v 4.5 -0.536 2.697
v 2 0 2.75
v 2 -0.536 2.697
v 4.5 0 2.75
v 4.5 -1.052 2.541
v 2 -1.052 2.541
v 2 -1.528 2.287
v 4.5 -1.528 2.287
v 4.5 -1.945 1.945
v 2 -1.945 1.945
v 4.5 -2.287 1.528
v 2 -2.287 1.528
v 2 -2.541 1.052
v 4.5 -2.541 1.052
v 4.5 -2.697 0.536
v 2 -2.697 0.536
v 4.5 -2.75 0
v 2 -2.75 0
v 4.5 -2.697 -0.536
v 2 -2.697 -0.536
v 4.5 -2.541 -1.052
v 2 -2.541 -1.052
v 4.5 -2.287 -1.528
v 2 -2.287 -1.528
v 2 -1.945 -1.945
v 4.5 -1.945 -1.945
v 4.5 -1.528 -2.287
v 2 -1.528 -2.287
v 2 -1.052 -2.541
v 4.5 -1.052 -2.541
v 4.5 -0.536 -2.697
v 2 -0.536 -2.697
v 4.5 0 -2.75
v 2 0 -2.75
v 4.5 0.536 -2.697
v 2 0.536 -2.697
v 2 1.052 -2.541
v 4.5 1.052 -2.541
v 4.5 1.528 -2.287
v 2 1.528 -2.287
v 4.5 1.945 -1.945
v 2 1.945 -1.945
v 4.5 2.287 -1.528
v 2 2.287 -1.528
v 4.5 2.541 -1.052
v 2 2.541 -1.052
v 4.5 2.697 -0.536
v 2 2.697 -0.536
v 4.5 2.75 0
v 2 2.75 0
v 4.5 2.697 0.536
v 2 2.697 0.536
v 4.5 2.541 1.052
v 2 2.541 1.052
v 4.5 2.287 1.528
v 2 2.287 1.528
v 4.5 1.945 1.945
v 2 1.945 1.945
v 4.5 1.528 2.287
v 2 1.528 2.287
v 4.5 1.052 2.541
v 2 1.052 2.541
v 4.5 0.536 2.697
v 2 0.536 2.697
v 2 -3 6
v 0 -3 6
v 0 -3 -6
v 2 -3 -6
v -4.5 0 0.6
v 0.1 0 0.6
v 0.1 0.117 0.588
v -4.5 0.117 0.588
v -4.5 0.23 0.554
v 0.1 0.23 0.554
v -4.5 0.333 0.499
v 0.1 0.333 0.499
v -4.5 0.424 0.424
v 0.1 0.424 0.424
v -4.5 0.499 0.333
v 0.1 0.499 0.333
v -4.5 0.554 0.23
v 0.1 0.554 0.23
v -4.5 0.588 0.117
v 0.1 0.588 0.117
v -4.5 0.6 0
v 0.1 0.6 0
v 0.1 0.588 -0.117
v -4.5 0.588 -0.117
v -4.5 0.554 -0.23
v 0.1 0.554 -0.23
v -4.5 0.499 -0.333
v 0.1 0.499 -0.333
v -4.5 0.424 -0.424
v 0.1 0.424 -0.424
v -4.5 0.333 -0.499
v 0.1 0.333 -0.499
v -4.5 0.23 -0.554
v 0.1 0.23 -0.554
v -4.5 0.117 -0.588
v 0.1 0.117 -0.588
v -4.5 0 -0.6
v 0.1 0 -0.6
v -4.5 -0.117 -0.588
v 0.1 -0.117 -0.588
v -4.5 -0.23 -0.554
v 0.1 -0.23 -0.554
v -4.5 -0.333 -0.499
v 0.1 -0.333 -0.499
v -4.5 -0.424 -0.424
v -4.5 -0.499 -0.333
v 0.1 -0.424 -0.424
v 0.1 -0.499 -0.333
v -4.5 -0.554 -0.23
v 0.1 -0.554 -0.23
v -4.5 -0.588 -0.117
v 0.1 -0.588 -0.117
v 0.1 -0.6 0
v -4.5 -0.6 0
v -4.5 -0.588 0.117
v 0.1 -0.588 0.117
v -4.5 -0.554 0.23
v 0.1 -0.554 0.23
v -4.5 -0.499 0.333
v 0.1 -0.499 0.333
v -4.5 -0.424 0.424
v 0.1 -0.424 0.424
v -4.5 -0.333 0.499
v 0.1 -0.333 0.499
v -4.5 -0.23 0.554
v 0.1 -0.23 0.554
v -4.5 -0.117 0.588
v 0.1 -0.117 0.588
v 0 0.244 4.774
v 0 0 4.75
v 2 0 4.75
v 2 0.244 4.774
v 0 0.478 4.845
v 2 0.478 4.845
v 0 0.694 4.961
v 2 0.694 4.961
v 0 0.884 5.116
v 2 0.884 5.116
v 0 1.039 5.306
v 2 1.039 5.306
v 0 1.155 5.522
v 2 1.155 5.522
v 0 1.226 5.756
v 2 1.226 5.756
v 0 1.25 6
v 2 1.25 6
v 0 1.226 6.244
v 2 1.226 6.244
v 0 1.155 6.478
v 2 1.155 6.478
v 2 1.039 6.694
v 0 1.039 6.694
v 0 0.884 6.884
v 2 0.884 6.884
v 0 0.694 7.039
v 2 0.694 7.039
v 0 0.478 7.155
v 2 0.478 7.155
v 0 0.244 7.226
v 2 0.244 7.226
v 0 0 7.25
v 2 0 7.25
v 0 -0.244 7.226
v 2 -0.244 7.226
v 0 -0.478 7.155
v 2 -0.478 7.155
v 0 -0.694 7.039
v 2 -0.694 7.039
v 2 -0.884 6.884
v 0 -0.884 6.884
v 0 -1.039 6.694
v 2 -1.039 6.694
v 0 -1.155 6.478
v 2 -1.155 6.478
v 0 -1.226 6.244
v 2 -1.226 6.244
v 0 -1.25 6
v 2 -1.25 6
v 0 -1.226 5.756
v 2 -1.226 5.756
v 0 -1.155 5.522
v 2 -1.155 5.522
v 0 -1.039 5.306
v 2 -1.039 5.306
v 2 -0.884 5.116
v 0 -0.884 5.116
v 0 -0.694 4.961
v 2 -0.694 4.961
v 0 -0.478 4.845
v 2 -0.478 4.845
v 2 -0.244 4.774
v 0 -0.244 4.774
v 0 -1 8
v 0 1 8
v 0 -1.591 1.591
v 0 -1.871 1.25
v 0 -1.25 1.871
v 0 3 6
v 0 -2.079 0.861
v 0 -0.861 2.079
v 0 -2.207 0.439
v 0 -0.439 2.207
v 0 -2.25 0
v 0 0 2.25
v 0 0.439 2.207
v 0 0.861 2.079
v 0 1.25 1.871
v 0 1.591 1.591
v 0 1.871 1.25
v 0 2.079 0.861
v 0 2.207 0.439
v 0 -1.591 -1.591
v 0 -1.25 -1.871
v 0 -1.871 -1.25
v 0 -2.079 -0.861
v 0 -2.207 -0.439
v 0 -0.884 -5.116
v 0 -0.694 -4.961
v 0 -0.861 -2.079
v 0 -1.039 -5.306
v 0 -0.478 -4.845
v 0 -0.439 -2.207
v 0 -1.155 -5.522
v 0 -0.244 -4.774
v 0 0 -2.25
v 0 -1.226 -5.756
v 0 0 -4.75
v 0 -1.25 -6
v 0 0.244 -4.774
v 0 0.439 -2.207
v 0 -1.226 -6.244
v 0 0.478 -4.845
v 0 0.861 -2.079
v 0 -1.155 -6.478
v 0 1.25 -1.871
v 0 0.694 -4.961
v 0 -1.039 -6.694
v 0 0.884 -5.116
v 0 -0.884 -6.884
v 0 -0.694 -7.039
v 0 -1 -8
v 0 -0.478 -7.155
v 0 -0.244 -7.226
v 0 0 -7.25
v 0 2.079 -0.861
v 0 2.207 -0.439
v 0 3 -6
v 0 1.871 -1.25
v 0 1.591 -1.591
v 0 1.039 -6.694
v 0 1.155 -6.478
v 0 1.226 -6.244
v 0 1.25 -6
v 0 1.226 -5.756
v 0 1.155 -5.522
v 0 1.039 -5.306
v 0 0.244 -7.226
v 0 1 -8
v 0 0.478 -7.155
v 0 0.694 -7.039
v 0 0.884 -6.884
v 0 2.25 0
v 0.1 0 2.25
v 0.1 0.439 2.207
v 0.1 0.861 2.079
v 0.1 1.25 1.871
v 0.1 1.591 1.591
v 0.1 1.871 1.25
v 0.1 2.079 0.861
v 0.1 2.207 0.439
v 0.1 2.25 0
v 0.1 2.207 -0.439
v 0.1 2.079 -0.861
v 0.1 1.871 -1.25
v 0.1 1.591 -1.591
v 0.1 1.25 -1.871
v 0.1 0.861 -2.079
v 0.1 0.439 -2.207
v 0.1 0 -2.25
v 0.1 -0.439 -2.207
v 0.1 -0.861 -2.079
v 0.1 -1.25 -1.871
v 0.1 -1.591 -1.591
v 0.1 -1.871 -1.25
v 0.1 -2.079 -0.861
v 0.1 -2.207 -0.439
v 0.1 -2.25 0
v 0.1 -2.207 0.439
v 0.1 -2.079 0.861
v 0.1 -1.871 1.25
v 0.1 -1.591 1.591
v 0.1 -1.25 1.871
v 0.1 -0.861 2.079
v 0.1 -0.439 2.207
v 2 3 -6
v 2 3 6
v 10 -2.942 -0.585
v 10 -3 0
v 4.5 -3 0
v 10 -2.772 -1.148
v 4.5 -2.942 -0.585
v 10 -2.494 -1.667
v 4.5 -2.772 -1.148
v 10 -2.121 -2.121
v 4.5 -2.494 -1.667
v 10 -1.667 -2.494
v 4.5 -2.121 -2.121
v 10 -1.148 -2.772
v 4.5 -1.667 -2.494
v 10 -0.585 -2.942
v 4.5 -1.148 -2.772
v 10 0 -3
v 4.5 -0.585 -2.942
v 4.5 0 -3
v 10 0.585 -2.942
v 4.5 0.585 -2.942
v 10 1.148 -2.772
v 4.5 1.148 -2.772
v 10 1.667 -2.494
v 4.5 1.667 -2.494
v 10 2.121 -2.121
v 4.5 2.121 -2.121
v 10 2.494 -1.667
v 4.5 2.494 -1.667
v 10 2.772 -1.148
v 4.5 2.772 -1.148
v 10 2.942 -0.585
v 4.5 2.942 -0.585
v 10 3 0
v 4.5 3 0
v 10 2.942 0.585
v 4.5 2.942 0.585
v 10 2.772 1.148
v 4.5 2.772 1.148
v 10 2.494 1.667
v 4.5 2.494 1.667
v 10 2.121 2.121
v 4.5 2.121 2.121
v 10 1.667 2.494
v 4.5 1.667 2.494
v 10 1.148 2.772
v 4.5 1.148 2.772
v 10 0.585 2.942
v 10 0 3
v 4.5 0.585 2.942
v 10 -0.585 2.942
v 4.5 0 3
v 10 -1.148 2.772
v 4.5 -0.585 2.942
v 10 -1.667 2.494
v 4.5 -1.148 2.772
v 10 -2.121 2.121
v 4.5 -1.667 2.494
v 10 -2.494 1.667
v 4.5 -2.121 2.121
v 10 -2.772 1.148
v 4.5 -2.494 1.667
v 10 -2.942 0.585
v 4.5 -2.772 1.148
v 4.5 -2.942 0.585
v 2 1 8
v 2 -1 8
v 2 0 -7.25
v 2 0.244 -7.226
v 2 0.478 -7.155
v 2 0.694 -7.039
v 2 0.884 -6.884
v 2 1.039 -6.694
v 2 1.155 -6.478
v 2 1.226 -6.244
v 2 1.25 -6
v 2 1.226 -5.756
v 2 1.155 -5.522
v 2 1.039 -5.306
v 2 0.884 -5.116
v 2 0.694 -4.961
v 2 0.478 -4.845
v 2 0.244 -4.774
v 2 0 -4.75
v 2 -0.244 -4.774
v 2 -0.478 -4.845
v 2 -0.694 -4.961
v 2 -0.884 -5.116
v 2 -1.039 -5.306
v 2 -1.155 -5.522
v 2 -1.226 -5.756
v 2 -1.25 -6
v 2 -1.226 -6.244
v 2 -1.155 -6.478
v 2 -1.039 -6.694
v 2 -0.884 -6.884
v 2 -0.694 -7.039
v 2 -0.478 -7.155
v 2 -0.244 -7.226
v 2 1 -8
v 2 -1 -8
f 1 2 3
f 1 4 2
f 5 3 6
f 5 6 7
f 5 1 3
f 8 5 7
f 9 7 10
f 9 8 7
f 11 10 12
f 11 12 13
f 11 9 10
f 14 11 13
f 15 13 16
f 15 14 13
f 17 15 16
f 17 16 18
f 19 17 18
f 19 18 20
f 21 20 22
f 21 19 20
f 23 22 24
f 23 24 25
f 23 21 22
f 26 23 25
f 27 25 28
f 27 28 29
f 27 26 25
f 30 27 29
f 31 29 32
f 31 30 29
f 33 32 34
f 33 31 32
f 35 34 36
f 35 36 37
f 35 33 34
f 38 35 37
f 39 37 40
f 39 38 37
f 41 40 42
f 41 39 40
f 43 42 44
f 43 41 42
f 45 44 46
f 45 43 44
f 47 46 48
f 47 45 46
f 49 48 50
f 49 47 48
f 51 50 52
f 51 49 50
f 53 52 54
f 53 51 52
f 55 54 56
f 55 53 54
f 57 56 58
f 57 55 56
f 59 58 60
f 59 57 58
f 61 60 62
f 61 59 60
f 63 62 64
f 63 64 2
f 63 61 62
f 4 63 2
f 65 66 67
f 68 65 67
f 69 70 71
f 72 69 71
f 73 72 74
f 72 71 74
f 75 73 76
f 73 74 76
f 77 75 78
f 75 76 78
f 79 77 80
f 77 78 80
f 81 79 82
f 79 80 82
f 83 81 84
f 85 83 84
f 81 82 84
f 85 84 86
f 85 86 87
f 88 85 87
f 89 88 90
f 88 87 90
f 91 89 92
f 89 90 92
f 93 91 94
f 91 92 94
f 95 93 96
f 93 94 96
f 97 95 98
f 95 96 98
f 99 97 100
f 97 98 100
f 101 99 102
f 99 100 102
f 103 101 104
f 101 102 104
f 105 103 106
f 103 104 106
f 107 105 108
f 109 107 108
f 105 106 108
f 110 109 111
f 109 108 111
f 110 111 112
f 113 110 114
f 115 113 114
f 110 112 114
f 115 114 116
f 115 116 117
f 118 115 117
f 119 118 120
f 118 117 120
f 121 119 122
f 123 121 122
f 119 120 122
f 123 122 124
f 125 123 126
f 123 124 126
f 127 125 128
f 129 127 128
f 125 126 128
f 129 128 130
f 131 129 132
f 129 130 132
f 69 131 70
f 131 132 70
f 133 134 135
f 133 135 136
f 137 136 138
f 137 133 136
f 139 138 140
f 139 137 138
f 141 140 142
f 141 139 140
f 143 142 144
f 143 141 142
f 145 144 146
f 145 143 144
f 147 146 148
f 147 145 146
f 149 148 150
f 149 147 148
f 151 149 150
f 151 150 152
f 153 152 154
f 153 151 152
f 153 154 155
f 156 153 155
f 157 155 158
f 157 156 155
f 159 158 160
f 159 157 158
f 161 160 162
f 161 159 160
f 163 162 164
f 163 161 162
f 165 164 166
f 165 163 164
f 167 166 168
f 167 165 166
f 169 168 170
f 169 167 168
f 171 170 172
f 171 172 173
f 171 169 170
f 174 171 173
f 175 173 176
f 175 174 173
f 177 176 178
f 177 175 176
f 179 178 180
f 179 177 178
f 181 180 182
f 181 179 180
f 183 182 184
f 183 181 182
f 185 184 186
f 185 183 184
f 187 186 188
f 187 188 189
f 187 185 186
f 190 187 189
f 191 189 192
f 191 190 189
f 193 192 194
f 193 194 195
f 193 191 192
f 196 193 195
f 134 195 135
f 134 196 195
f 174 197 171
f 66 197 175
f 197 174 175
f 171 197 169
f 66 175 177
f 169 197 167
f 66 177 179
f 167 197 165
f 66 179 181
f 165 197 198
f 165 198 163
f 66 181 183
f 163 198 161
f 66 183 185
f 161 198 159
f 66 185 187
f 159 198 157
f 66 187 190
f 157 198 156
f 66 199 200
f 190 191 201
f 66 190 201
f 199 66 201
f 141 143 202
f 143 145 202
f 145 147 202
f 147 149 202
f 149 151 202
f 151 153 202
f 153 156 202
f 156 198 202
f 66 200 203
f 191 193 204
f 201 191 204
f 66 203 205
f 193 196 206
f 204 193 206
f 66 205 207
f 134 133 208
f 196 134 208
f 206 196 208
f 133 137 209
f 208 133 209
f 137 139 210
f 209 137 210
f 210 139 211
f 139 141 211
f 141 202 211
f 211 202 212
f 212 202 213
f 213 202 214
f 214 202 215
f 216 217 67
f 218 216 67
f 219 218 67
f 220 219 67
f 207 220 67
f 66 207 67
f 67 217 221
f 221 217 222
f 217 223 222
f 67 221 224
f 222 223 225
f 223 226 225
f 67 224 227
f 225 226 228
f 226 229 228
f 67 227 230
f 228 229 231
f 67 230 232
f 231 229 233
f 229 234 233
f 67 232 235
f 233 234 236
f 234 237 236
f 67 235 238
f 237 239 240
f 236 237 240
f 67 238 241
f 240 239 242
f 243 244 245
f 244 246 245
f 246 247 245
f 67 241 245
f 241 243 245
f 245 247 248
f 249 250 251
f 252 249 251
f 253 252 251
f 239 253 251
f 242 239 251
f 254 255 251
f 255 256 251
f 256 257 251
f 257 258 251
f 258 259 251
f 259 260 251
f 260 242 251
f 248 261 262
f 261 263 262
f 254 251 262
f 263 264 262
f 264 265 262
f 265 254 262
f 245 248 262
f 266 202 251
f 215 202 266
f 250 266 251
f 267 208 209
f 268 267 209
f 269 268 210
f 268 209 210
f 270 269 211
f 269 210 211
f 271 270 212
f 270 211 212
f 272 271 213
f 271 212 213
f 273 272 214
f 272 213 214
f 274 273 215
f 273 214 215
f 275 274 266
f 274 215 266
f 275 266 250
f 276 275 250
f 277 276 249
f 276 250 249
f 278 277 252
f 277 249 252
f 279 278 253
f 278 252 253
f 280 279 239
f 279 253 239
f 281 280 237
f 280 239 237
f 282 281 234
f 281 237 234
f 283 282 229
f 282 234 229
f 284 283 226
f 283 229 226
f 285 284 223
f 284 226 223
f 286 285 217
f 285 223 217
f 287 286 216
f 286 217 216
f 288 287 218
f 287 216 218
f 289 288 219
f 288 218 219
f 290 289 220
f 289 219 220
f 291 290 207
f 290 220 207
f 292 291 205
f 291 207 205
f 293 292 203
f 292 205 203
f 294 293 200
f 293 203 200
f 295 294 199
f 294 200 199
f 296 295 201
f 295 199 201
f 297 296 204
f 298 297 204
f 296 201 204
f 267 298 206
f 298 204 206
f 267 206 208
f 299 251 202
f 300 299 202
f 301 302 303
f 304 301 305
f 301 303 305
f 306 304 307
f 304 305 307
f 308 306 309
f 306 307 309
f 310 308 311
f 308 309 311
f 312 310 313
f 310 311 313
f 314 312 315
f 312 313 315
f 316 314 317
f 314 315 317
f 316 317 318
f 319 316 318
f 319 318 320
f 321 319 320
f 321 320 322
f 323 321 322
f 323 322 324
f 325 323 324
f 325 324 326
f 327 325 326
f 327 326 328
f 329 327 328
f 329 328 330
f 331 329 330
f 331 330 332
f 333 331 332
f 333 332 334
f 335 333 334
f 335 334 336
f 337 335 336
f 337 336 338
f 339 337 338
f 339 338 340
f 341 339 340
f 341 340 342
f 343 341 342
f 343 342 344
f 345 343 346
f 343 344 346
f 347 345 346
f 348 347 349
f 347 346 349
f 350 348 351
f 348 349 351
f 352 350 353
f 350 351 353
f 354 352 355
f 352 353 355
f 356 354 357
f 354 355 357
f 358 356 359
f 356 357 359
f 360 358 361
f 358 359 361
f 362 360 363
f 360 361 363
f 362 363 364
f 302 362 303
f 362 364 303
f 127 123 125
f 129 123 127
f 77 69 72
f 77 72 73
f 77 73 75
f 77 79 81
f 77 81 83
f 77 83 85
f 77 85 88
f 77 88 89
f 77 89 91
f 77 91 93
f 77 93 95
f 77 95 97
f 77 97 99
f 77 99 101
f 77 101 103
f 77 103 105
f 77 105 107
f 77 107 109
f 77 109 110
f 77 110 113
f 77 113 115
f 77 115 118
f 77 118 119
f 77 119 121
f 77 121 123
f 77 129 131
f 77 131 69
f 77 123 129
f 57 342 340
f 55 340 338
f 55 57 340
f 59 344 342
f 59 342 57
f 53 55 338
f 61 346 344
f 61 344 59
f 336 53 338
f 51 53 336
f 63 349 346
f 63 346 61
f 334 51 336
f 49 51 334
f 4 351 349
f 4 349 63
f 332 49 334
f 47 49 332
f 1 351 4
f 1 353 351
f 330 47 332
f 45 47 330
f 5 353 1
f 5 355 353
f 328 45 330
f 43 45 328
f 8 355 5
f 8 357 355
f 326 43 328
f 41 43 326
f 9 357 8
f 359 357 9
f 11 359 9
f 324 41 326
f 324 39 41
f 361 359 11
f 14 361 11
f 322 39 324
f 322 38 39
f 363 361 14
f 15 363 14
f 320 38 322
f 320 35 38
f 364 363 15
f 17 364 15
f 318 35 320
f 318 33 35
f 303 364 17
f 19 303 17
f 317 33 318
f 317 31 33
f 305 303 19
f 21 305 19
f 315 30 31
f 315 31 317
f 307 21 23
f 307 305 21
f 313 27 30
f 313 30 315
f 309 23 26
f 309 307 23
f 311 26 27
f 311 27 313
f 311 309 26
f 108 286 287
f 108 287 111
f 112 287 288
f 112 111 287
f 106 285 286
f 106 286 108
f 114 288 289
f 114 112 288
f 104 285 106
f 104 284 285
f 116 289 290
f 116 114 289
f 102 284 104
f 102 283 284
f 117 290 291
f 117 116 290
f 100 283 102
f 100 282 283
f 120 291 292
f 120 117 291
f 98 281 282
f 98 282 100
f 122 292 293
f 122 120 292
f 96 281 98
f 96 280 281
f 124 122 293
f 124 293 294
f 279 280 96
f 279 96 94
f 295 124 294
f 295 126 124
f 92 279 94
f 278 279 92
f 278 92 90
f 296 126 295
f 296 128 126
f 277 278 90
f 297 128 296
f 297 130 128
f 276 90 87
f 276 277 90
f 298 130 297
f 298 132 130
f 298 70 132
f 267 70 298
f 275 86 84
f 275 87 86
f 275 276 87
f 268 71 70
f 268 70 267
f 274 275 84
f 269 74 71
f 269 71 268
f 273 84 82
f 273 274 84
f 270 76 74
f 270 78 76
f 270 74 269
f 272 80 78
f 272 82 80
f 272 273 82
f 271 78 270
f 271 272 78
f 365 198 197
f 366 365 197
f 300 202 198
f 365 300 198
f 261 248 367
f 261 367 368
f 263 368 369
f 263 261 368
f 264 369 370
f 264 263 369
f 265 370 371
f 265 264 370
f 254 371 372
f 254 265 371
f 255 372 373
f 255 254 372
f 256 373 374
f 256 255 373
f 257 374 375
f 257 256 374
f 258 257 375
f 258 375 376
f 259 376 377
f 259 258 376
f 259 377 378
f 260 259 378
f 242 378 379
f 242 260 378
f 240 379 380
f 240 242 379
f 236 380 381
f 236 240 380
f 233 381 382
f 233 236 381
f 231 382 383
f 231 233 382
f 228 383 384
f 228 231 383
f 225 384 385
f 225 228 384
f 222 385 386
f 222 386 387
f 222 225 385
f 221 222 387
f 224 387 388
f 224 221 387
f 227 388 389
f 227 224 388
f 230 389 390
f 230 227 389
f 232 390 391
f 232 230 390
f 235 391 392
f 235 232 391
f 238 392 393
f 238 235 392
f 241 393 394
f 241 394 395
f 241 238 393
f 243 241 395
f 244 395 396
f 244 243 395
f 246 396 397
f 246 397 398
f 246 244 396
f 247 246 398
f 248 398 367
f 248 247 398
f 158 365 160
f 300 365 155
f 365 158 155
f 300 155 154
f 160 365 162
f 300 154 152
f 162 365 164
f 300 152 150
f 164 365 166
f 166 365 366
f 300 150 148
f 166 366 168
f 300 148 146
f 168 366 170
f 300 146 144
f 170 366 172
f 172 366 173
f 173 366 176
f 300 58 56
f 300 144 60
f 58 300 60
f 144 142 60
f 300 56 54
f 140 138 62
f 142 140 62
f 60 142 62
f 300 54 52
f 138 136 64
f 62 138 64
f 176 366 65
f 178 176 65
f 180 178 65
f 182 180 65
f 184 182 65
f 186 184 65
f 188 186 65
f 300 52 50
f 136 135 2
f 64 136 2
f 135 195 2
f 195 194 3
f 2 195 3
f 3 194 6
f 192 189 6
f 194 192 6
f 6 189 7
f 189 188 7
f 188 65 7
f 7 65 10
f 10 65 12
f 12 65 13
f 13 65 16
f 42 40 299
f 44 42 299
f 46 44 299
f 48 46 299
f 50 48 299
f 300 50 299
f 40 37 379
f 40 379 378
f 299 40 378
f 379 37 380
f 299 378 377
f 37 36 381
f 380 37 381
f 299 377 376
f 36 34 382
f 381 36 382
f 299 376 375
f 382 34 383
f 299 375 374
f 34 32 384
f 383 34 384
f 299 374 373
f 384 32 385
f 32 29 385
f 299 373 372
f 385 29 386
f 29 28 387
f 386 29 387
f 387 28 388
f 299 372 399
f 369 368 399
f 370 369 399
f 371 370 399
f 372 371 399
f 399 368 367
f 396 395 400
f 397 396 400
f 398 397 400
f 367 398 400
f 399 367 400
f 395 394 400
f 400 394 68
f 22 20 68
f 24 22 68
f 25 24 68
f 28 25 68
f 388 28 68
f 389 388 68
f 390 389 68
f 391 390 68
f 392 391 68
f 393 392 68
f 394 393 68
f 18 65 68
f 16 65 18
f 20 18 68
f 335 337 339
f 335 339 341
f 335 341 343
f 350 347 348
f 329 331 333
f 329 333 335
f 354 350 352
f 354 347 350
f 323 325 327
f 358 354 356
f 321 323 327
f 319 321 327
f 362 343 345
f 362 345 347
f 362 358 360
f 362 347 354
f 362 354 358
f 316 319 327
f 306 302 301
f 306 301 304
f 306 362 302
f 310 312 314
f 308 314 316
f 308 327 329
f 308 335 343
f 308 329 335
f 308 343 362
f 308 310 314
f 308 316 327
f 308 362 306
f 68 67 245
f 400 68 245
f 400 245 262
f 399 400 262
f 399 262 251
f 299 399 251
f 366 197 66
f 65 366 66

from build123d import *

# Parameters (mm, degrees)
SKETCH_1_R          = 1.25
EXTRUDE_1_DEPTH     = 2
SKETCH_2_R          = 2.25
CUT_EXTRUDE_1_DEPTH = 0.1
SKETCH_6_R          = 0.6
EXTRUDE_2_DEPTH     = 4.6
SKETCH_7_R          = 3
EXTRUDE_3_DEPTH     = 8
SKETCH_8_W          = 2.5
SKETCH_8_H          = 0.25


with BuildPart() as part:
    # Эскиз1 → Бобышка-Вытянуть1 (new body)
    with BuildSketch(Plane(origin=(0, 0, 0), x_dir=(0, 0, -1), z_dir=(1, 0, 0))):
        Polygon((-6, 3), (-8, 1), (-8, -1), (-6, -3), (6, -3), (8, -1), (8, 1), (6, 3), align=None)
        with Locations((-6, 0)):
            Circle(SKETCH_1_R, mode=Mode.SUBTRACT)
        with Locations((6, 0)):
            Circle(SKETCH_1_R, mode=Mode.SUBTRACT)
    extrude(amount=EXTRUDE_1_DEPTH)

    # Эскиз2 → Вырез-Вытянуть1 (cut)
    with BuildSketch(Plane.ZY):
        Circle(SKETCH_2_R)
    extrude(amount=-CUT_EXTRUDE_1_DEPTH, mode=Mode.SUBTRACT)

    # Эскиз6 → Бобышка-Вытянуть2 (add)
    with BuildSketch(Plane.ZY.offset(-0.1)):
        Circle(SKETCH_6_R)
    extrude(amount=EXTRUDE_2_DEPTH)

    # Эскиз7 → Бобышка-Вытянуть3 (add)
    with BuildSketch(Plane(origin=(2, 0, 0), x_dir=(0, 0, -1), z_dir=(1, 0, 0))):
        with Locations(Location((0, 0, 0), (0, 0, 270))):
            Circle(SKETCH_7_R)
    extrude(amount=EXTRUDE_3_DEPTH)

    # Эскиз8 → Вырез-Повернуть1 (revolve, cut)
    with BuildSketch(Plane.XY, mode=Mode.PRIVATE) as cut_revolve_1_sk:
        with Locations((3.25, 2.875)):
            Rectangle(SKETCH_8_W, SKETCH_8_H)
    revolve(cut_revolve_1_sk.sketch.rotate(Axis((-1000, 0, 0), (1, 0, 0)), 90), axis=Axis((-1000, 0, 0), (1, 0, 0)), mode=Mode.SUBTRACT)


solid = part.part
